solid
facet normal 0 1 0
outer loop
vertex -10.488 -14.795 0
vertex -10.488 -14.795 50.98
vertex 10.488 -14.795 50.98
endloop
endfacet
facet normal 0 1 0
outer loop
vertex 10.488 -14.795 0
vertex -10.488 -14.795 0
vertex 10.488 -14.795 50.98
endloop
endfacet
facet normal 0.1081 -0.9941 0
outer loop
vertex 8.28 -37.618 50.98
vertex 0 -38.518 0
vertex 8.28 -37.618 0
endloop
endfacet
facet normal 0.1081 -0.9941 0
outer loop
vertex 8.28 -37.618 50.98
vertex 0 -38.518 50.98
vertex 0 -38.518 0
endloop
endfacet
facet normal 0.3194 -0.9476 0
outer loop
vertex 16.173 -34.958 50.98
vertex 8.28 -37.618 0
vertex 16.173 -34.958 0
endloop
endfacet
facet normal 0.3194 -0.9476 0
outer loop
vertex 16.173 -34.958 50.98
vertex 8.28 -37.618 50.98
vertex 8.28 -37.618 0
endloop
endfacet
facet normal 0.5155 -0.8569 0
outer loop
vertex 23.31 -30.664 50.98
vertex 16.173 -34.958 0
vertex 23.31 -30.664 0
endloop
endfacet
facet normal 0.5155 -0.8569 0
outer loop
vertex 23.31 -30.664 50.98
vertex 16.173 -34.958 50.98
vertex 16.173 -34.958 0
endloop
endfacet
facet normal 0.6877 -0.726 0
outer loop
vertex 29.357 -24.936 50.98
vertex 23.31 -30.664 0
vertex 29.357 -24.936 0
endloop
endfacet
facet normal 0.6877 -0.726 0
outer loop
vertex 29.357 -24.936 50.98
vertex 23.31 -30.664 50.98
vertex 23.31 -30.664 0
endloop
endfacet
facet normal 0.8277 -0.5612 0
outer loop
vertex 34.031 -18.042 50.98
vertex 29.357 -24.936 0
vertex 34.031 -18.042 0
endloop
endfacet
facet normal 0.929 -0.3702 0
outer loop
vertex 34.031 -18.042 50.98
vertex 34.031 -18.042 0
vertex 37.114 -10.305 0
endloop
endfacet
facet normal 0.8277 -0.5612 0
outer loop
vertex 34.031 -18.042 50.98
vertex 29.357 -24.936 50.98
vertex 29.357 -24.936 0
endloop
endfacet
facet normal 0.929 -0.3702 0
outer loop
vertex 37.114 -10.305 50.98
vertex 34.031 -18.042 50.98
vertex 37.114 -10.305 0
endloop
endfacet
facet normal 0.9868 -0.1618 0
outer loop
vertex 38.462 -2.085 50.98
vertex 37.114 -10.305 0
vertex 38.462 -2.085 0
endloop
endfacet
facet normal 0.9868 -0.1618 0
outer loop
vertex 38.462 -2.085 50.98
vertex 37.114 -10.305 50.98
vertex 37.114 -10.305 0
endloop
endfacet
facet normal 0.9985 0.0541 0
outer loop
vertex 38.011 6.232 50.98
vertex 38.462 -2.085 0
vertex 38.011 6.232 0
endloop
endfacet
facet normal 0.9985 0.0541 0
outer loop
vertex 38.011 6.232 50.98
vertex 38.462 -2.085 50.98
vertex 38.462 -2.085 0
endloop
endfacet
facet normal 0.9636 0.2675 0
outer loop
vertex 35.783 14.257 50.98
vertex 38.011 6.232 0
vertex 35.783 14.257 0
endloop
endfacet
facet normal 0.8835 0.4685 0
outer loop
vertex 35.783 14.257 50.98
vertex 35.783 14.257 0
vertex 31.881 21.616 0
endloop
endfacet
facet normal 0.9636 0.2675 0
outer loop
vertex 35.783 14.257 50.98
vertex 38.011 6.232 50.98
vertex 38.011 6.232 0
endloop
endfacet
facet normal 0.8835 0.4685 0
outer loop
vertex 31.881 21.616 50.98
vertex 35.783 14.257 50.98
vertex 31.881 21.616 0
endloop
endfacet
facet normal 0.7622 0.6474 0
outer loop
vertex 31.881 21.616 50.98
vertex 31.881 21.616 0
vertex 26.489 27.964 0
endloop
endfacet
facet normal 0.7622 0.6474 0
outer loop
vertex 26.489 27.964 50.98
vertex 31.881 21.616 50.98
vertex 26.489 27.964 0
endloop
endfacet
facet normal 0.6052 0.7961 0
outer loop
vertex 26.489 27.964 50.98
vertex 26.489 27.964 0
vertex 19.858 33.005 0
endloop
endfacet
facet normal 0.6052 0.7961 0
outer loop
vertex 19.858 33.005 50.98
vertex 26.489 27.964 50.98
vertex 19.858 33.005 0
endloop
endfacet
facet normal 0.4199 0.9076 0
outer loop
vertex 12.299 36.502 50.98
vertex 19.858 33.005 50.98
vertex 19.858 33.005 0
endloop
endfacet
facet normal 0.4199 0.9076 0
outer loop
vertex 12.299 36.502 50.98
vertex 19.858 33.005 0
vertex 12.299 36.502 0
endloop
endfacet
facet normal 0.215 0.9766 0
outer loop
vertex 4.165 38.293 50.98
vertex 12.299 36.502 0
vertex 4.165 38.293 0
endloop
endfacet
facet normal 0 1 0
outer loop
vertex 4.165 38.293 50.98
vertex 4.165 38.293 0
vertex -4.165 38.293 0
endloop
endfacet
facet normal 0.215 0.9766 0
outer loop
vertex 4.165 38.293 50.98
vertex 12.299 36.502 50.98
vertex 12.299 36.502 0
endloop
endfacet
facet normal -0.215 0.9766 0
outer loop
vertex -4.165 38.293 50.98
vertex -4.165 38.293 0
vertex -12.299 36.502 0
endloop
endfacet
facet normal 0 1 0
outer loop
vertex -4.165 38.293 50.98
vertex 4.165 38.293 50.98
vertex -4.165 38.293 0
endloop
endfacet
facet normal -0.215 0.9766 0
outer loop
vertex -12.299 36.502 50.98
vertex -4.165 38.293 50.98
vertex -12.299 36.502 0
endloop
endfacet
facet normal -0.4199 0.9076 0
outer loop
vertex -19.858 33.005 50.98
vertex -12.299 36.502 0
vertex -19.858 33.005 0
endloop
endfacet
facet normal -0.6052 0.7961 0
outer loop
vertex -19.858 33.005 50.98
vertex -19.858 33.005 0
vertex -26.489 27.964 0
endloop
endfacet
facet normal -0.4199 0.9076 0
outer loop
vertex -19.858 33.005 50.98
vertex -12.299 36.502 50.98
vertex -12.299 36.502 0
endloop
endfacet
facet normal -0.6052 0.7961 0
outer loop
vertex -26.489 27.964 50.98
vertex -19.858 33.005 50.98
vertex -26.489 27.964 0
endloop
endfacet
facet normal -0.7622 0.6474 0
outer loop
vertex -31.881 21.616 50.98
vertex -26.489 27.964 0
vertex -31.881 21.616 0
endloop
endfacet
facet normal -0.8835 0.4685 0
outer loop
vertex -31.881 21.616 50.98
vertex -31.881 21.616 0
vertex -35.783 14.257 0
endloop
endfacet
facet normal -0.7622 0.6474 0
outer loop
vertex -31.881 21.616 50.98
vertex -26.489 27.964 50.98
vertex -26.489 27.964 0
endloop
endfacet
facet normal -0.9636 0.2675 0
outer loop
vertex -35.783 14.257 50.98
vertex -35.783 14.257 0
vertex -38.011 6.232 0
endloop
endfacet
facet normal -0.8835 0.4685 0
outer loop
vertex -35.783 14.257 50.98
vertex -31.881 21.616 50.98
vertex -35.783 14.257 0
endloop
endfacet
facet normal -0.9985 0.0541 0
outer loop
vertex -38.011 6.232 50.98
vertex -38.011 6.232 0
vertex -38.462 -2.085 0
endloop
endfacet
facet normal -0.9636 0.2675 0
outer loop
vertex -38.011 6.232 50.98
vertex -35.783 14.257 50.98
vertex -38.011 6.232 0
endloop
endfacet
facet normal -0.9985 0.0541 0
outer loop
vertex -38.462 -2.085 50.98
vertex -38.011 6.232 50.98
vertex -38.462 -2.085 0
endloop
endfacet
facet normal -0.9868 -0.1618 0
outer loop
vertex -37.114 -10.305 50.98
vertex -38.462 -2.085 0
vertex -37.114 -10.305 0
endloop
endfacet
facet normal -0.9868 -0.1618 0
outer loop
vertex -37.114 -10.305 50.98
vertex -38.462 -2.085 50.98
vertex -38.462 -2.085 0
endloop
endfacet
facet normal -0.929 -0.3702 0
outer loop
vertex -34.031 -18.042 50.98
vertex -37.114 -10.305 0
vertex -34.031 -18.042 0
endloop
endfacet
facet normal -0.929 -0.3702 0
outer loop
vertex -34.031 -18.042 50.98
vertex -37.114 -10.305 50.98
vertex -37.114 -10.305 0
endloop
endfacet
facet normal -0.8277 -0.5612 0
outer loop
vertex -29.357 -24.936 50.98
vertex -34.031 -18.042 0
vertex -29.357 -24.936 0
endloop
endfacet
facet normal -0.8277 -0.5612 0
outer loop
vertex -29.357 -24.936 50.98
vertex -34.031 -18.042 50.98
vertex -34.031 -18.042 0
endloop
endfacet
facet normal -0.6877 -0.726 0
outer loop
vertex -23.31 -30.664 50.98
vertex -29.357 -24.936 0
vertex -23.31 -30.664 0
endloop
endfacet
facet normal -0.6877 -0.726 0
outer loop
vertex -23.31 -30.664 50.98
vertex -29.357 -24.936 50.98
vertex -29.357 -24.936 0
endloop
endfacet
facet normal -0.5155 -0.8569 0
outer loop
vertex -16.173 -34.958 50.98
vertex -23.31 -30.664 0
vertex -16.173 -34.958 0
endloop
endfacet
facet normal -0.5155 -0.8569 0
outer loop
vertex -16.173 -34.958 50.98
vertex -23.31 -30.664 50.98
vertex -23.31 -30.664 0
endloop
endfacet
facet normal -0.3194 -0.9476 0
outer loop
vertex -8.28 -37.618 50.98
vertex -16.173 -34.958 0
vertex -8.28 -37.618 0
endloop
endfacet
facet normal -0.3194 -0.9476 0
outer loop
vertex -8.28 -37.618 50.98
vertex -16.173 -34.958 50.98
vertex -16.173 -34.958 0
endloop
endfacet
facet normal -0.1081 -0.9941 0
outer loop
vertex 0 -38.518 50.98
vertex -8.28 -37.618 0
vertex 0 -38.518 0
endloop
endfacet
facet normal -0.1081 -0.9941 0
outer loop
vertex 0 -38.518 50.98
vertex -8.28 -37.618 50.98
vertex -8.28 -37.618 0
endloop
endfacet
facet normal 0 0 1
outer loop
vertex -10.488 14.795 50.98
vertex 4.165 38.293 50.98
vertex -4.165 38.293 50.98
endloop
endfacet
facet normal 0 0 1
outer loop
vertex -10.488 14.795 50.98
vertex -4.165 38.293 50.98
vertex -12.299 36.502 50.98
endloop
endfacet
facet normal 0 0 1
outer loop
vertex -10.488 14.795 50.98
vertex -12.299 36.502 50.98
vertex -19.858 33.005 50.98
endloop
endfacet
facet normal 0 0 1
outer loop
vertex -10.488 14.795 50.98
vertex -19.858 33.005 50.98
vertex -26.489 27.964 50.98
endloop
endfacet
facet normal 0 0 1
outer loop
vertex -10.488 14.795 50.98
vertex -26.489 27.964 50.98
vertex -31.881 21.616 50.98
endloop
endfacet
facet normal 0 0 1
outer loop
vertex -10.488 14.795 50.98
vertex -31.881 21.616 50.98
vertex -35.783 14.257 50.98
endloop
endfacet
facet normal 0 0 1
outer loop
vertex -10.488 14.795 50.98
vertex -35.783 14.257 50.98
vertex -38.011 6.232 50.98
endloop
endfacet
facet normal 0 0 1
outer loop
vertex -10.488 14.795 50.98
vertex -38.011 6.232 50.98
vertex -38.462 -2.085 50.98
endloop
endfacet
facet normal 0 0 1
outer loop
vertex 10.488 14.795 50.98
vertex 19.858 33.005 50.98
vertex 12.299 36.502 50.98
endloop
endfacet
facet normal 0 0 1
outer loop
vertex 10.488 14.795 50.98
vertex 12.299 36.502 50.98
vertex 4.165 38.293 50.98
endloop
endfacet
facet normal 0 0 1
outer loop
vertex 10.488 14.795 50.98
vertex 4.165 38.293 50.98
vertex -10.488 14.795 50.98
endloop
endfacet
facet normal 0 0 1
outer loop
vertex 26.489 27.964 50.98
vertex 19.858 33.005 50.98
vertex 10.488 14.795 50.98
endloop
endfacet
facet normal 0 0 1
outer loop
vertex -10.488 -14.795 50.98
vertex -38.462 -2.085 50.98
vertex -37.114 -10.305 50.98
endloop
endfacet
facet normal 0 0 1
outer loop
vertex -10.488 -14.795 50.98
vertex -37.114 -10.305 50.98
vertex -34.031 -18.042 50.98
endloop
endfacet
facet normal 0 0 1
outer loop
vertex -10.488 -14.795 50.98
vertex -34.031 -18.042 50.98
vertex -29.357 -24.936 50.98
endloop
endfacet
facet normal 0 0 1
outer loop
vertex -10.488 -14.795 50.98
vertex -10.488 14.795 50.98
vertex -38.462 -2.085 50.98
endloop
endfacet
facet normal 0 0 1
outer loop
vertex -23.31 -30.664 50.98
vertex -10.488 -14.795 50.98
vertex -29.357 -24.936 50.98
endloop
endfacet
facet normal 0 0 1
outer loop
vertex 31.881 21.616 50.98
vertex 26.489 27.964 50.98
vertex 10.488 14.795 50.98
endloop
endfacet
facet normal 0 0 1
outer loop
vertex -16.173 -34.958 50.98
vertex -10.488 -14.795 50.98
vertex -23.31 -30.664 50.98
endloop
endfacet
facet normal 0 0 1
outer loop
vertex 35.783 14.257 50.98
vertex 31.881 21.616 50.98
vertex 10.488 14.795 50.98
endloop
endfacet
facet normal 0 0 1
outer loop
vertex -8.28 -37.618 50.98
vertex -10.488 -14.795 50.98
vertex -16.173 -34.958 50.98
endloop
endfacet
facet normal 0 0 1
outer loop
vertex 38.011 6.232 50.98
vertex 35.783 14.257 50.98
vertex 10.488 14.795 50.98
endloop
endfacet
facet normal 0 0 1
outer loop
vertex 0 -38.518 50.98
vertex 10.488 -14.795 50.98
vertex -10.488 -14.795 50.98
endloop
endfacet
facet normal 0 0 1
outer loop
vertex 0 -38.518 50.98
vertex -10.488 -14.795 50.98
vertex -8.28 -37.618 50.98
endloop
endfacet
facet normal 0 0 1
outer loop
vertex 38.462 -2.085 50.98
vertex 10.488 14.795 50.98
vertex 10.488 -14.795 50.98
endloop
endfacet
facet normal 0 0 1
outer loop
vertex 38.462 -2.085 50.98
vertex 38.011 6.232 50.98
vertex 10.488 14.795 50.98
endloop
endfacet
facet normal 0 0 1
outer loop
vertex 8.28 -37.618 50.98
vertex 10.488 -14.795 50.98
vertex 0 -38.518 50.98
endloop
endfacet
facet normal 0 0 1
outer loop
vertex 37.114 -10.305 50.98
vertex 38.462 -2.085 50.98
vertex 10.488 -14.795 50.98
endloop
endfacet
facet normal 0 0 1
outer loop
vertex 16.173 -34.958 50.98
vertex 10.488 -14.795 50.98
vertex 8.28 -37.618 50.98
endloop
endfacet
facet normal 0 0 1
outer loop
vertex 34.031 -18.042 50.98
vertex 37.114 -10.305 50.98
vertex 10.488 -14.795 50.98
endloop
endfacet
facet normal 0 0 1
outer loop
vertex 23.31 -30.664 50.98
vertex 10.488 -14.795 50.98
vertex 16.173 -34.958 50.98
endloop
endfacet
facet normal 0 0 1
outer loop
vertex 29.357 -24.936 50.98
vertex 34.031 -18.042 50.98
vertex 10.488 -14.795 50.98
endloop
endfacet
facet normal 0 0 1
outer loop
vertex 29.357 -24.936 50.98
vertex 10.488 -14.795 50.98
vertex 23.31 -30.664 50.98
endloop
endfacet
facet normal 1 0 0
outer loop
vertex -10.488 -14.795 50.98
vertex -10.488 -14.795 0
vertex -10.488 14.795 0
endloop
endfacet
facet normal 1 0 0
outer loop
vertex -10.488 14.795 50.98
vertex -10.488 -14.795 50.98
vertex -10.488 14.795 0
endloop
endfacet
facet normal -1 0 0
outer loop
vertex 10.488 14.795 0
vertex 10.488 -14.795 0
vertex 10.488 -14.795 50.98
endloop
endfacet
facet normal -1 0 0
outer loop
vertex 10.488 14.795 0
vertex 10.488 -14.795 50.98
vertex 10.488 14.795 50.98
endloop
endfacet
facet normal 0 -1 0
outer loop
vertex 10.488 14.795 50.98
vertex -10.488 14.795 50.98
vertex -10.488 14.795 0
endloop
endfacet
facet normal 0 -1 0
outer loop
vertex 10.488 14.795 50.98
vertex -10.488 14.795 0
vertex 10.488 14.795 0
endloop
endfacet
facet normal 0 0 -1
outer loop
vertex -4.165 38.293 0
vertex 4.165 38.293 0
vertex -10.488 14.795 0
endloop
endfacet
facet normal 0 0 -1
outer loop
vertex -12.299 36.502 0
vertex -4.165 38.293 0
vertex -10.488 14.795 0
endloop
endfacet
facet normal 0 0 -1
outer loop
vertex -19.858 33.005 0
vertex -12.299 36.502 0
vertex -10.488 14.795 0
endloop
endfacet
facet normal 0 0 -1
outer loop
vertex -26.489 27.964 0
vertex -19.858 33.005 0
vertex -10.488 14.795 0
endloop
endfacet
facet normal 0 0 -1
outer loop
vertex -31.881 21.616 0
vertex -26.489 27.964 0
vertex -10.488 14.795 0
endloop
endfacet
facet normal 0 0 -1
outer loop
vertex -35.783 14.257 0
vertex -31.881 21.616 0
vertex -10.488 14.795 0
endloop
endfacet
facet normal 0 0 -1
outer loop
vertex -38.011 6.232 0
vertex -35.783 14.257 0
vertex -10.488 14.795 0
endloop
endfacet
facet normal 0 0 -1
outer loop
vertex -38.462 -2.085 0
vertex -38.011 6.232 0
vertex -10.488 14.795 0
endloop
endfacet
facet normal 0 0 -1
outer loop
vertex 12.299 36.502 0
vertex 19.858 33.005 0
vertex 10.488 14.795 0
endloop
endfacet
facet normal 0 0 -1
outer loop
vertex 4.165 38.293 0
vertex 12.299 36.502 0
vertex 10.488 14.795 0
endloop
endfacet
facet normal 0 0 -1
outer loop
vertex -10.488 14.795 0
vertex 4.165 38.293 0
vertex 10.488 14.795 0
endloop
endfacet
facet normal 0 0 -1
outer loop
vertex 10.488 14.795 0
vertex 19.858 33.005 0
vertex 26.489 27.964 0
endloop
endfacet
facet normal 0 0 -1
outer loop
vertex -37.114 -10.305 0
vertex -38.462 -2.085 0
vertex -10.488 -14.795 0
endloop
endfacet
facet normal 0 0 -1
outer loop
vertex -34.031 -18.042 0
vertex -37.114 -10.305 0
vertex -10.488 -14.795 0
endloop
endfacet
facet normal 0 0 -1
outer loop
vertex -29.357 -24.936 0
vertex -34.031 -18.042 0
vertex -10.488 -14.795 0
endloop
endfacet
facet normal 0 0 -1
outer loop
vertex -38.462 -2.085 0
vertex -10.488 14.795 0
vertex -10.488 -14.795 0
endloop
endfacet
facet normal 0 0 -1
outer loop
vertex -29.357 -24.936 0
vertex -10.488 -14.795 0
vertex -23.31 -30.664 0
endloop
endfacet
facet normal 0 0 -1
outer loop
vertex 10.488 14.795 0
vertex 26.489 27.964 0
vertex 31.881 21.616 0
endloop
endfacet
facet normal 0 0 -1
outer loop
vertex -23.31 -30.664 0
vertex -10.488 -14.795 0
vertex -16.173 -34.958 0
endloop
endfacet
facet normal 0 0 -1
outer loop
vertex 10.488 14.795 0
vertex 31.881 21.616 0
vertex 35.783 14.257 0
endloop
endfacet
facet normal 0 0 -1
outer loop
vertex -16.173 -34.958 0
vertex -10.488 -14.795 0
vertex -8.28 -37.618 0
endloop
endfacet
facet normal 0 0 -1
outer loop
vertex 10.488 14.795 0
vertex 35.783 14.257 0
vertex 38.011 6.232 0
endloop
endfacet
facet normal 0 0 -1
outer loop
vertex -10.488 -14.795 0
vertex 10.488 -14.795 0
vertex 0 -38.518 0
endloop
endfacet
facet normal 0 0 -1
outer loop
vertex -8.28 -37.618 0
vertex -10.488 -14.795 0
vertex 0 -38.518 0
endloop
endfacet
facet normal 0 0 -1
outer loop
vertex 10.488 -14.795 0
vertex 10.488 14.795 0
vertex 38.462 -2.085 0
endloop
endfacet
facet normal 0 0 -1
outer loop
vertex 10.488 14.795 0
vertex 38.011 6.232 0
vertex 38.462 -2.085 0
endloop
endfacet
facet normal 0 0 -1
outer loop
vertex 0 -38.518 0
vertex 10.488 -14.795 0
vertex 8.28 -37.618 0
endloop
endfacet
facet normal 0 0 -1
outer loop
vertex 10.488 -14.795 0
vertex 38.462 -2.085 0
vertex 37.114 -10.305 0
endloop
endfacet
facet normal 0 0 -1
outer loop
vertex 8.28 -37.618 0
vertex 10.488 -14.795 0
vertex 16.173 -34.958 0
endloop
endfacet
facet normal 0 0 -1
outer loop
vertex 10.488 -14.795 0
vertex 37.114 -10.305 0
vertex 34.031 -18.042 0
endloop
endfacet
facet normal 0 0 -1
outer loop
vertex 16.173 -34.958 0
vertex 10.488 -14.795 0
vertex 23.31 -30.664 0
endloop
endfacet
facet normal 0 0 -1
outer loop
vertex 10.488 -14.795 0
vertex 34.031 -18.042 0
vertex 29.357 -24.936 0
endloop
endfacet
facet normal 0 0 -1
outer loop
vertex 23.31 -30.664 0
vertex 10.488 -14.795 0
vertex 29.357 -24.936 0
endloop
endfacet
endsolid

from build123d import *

# Parameters (mm, degrees)
F0_W     = 38.5183766484
F0_H     = 50.980206579
F2_W     = 20.9750365466
F2_H     = 29.5896790922
F3_DEPTH = 50.981206579


with BuildPart() as f1:
    # F0 (on Right) → F1 (revolve)
    with BuildSketch(Plane.YZ):
        with Locations((-19.2591883242, 25.4901032895)):
            Rectangle(F0_W, F0_H)
    revolve(axis=Axis((0, 0, 25.4901032895), (0, 0, 1)))

    # F2 (on face) → F3 (cut, through all)
    with BuildSketch(Plane.XY.offset(50.980206579)):
        Rectangle(F2_W, F2_H)
    extrude(amount=-F3_DEPTH, mode=Mode.SUBTRACT)


solid = f1.part
